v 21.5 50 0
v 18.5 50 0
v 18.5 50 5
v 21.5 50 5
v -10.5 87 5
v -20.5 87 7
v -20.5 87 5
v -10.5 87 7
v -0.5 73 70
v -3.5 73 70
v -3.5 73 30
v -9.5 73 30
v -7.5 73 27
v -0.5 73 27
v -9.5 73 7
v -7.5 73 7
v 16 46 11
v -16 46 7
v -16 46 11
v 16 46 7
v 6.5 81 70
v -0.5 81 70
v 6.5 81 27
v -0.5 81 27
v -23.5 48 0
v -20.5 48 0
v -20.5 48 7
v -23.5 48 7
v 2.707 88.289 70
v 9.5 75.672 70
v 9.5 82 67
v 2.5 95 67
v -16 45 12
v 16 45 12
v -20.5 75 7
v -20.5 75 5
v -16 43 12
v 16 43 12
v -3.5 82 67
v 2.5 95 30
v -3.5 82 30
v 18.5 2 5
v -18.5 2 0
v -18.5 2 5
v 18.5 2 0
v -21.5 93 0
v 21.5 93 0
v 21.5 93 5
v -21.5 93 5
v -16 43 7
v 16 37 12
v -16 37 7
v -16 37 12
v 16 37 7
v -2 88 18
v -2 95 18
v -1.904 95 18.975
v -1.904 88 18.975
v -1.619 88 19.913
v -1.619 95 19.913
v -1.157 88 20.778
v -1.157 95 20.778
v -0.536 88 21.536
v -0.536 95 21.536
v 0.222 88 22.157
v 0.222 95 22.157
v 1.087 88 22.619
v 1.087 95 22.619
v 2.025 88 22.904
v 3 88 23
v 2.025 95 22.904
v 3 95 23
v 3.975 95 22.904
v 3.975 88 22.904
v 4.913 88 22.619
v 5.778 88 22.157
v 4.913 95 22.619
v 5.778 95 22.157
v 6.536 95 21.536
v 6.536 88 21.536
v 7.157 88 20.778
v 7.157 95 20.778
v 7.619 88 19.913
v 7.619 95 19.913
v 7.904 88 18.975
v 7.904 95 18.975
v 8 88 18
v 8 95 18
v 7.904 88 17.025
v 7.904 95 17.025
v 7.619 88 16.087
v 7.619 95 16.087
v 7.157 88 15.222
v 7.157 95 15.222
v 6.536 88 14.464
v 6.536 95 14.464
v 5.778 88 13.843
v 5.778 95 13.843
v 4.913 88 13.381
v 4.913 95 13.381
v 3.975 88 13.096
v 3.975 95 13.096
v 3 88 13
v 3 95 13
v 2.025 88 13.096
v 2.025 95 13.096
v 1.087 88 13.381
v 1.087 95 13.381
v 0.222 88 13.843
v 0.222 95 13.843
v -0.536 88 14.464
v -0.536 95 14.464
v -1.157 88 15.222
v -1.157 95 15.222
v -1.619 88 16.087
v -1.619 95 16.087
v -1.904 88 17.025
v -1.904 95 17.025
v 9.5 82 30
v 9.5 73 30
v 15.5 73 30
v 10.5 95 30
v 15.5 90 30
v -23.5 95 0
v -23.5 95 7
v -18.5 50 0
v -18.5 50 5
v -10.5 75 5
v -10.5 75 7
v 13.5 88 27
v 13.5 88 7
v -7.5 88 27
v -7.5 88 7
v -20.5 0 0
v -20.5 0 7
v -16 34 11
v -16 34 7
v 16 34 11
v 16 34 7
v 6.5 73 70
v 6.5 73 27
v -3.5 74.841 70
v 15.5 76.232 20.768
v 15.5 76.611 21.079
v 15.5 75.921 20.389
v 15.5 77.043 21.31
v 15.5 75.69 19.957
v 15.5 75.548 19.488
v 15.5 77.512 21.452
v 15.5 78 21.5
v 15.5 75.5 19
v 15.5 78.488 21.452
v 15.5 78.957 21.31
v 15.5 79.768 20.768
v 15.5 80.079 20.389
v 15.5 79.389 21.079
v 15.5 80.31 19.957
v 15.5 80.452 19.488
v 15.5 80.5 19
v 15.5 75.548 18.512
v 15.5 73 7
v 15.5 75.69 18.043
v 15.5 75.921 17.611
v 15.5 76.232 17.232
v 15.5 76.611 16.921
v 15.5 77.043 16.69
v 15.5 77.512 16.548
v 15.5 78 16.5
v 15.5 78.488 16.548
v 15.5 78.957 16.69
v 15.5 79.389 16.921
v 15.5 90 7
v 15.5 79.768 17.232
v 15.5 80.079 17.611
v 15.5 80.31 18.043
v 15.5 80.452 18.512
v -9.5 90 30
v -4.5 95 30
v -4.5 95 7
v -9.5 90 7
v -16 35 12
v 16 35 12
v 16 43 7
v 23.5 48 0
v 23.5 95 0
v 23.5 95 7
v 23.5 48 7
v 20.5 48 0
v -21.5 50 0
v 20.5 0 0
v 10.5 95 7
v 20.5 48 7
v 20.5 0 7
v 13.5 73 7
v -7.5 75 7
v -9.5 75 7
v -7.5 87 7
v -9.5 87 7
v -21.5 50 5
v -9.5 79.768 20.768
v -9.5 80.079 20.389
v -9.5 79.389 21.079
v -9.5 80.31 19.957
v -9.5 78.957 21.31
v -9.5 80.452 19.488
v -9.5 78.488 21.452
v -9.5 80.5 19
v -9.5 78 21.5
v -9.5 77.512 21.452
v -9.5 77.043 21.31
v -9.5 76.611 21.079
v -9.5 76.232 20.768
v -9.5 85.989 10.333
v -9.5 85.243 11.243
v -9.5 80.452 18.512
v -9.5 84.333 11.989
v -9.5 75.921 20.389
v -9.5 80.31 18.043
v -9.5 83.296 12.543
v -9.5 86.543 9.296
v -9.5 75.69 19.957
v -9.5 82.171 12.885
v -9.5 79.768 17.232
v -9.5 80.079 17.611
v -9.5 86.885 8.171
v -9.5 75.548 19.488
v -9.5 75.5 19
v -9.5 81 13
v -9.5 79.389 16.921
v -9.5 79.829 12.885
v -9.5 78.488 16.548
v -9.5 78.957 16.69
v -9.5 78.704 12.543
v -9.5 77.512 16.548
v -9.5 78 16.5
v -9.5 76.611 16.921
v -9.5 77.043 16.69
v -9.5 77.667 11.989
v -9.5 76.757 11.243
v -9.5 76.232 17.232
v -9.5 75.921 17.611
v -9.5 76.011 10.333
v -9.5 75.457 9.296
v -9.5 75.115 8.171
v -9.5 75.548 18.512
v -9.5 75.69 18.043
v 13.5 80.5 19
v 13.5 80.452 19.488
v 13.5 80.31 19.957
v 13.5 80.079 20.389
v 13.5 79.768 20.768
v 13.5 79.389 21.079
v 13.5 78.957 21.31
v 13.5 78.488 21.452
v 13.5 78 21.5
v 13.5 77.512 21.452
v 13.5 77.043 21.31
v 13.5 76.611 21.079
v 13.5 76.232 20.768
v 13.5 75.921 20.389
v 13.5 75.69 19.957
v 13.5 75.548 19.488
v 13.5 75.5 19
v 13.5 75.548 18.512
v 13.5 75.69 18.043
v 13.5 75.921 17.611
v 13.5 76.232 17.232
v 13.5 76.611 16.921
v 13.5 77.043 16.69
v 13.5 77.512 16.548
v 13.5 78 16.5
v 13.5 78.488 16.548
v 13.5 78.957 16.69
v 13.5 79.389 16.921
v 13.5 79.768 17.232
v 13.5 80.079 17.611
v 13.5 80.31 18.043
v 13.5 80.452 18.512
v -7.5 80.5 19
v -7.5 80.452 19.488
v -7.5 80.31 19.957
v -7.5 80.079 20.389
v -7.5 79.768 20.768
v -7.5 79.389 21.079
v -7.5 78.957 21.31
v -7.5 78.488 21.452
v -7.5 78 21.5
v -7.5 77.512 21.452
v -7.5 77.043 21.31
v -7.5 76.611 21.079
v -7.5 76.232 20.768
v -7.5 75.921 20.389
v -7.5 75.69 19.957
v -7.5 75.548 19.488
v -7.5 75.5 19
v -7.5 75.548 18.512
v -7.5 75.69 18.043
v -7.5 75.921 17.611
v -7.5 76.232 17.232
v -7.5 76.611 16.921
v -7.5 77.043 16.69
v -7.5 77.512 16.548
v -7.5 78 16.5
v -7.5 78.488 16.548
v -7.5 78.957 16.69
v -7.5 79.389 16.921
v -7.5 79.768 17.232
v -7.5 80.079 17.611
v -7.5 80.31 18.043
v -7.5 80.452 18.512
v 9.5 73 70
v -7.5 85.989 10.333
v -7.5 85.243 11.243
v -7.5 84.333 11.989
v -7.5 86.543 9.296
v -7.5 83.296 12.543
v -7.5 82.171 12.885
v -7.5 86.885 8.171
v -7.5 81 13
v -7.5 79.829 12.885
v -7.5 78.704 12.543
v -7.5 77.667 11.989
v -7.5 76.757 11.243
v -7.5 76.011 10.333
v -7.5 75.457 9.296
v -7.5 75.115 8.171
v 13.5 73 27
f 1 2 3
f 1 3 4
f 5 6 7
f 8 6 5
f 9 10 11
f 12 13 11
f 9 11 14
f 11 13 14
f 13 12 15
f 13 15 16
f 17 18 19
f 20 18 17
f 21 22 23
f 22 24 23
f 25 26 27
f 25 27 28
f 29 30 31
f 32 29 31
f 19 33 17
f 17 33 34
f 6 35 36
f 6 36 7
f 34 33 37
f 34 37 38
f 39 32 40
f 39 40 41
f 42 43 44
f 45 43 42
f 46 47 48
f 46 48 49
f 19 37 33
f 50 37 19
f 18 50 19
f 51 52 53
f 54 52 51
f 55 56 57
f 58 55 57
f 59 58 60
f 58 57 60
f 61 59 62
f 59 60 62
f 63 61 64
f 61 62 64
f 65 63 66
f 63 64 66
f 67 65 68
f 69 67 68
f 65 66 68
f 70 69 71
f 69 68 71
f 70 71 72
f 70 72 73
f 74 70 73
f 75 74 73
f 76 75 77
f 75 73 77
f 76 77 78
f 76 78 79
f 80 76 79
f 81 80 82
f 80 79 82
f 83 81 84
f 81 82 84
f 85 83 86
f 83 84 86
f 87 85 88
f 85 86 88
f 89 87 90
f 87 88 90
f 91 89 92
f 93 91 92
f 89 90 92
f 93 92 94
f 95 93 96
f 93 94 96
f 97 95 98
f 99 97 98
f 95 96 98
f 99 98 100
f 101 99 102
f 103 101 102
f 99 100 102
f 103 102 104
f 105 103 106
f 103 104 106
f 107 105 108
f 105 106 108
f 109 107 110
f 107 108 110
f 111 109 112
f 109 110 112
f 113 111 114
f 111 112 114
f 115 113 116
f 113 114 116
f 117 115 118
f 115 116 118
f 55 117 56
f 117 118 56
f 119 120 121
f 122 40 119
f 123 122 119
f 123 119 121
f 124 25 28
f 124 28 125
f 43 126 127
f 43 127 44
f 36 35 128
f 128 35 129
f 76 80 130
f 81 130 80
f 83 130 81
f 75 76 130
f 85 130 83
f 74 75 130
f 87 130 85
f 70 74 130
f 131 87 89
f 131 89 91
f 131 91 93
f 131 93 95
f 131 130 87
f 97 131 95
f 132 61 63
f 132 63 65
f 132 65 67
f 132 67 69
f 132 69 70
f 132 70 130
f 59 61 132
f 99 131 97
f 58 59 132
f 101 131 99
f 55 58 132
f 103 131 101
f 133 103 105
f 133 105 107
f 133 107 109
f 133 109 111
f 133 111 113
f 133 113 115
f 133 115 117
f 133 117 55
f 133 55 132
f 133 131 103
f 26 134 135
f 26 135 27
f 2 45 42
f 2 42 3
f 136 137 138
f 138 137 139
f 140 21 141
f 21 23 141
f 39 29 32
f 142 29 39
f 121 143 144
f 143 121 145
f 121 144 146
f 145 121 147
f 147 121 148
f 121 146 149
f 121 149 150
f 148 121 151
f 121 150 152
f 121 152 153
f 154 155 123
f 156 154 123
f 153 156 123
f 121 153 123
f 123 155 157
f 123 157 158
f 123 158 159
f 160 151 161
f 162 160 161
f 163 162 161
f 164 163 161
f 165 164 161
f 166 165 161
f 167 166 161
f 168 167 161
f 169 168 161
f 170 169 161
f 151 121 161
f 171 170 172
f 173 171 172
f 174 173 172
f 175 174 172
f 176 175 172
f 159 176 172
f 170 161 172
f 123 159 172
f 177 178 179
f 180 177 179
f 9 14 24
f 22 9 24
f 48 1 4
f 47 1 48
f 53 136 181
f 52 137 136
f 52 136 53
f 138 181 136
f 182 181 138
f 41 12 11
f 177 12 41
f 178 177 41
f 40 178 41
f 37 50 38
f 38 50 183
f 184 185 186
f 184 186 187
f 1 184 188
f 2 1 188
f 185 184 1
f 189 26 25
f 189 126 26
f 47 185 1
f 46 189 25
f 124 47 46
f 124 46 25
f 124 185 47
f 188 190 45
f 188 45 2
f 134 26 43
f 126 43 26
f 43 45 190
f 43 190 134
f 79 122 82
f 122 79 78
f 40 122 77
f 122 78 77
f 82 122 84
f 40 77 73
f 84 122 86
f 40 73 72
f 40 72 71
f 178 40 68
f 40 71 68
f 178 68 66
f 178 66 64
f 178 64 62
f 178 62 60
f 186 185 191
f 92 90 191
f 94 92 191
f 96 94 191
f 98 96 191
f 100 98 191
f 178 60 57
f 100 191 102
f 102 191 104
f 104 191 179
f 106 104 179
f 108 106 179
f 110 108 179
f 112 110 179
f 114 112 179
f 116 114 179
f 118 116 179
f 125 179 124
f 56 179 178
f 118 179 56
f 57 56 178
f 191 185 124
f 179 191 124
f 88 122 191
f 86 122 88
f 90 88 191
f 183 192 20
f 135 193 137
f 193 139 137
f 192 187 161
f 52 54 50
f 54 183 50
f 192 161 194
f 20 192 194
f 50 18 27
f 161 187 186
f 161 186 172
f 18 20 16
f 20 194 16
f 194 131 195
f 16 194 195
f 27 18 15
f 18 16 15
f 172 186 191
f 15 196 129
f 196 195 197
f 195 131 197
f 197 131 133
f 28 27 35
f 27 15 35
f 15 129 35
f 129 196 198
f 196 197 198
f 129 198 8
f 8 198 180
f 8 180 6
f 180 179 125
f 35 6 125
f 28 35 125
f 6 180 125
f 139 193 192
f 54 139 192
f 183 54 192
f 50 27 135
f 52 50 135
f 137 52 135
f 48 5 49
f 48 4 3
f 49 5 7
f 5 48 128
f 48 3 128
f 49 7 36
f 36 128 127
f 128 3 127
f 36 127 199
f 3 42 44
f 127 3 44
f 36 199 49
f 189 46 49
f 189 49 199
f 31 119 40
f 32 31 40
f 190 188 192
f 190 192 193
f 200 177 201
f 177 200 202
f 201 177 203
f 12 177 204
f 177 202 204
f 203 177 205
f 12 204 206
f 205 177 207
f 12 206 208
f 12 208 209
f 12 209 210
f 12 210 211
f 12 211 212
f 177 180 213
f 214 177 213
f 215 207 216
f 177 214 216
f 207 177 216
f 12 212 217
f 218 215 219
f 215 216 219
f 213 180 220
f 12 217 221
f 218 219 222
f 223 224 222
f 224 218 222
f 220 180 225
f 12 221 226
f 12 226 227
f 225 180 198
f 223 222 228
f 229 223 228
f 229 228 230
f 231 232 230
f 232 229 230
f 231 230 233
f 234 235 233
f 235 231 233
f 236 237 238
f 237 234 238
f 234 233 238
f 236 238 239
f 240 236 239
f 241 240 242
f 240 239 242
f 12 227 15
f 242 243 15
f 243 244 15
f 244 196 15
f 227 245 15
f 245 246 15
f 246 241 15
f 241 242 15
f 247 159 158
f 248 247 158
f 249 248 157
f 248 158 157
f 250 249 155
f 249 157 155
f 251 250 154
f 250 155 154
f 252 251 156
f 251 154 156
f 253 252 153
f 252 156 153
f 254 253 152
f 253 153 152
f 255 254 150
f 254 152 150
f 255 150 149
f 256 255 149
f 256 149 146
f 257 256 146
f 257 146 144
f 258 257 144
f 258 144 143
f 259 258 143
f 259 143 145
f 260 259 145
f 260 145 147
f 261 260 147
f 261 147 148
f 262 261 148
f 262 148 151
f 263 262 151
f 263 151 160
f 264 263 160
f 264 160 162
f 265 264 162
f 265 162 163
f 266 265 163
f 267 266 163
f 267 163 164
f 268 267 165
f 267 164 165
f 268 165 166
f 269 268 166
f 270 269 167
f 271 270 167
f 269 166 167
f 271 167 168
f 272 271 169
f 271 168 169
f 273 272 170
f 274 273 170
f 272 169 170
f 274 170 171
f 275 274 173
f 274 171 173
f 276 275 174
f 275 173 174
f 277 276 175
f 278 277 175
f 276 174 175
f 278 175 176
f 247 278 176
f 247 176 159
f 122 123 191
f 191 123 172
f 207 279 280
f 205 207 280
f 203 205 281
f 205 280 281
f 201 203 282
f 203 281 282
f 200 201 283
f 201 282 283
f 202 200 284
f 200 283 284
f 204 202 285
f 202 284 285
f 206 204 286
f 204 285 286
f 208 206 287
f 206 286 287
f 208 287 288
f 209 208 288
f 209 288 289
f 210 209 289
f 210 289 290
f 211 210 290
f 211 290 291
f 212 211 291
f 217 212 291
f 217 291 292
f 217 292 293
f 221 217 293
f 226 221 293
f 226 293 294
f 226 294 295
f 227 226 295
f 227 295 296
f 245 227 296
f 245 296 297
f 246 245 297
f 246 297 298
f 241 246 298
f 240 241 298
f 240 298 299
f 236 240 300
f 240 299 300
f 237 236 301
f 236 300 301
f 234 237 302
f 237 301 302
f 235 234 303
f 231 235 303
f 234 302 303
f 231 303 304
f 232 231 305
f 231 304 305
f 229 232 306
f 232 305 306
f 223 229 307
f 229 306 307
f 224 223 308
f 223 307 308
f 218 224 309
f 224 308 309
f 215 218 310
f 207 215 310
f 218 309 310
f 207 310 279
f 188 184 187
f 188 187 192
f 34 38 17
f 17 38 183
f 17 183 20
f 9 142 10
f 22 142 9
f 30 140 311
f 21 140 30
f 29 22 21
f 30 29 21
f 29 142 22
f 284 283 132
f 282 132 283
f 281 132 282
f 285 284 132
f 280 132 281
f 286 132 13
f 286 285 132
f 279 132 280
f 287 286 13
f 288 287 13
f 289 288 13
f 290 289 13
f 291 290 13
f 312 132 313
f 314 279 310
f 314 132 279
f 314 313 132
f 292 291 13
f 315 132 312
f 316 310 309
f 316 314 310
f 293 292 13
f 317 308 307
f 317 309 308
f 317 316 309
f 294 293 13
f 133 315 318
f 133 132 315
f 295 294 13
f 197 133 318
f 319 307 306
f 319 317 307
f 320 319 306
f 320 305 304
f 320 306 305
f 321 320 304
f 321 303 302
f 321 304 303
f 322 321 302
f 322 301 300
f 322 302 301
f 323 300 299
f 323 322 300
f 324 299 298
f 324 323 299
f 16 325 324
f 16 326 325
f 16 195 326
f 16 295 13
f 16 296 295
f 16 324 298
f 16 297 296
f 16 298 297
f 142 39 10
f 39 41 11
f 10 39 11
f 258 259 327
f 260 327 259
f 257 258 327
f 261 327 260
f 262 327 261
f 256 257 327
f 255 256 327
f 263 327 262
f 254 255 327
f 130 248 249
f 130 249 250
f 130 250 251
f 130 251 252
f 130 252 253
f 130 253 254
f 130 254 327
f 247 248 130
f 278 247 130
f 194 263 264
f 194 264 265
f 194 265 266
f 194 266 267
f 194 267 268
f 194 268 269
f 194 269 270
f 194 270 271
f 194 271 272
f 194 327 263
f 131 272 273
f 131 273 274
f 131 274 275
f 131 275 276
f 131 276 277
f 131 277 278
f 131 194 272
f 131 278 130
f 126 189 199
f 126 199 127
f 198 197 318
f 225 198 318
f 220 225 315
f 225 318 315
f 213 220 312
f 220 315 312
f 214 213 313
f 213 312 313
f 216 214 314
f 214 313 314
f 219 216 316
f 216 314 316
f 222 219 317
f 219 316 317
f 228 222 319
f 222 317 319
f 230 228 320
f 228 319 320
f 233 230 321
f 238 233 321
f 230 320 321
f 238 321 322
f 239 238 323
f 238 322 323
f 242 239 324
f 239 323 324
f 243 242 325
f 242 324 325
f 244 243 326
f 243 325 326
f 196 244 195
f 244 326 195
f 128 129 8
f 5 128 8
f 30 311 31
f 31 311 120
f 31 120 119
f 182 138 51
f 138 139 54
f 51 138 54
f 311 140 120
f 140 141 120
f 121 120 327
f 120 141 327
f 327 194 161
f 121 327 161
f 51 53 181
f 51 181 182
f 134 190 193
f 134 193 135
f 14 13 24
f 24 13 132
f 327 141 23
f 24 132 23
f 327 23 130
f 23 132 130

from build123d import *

# Parameters (mm, degrees)
PAD_DEPTH       = 7
POCKET_DEPTH    = 5
SKETCH002_W     = 32
SKETCH002_H     = 3
PAD001_DEPTH    = 5
SKETCH003_W     = 10
SKETCH003_H     = 12
POCKET001_DEPTH = 2
PAD002_DEPTH    = 20
POCKET002_DEPTH = 5
SKETCH006_R     = 5
POCKET003_DEPTH = 7
PAD003_DEPTH    = 3
PAD004_DEPTH    = 40
CHAMFER_SIZE    = 5
CHAMFER001_SIZE = 5
CHAMFER002_SIZE = 3
CHAMFER003_SIZE = 1
CHAMFER004_SIZE = 1
SKETCH009_R     = 2.5
POCKET004_DEPTH = 39.001


with BuildPart() as part:
    # Sketch → Pad (new body)
    with BuildSketch(Plane.XY):
        Polygon((-23.5, 95), (23.5, 95), (23.5, 48), (20.5, 48), (20.5, 0), (-20.5, 0), (-20.5, 48), (-23.5, 48), align=None)
    extrude(amount=PAD_DEPTH)

    # Sketch001 (on Face9 of Pad) → Pocket (cut)
    with BuildSketch(Plane(origin=(0, 0, 0), x_dir=(1, 0, 0), z_dir=(0, 0, -1))):
        Polygon((-18.5, -2), (18.5, -2), (18.5, -50), (21.5, -50), (21.5, -93), (-21.5, -93), (-21.5, -50), (-18.5, -50), align=None)
    extrude(amount=-POCKET_DEPTH, mode=Mode.SUBTRACT)

    # Sketch002 (on Face5 of Pocket) → Pad001 (join)
    with BuildSketch(Plane.XY.offset(7)):
        with Locations((0, 44.5)):
            Rectangle(SKETCH002_W, SKETCH002_H)
        with Locations((0, 35.5)):
            Rectangle(SKETCH002_W, SKETCH002_H)
    extrude(amount=PAD001_DEPTH)

    # Sketch003 (on Face5 of Pad001) → Pocket001 (cut)
    with BuildSketch(Plane.XY.offset(7)):
        with Locations((-15.5, 81)):
            Rectangle(SKETCH003_W, SKETCH003_H)
    extrude(amount=-POCKET001_DEPTH, mode=Mode.SUBTRACT)

    # Sketch004 (on Face5 of Pocket001) → Pad002 (join)
    with BuildSketch(Plane.XY.offset(7)):
        Polygon((-9.5, 95), (15.5, 95), (15.5, 73), (13.5, 73), (13.5, 88), (-7.5, 88), (-7.5, 73), (-9.5, 73), align=None)
    extrude(amount=PAD002_DEPTH)

    # Sketch005 (on Face24 of Pad002) → Pocket002 (cut)
    with BuildSketch(Plane.YZ.offset(-7.5)):
        with BuildLine():
            ThreePointArc((87, 7), (81, 13), (75, 7))
            Line((75, 7), (87, 7))
        make_face()
    extrude(amount=-POCKET002_DEPTH, mode=Mode.SUBTRACT)

    # Sketch006 (on Face6 of Pad002) → Pocket003 (cut)
    with BuildSketch(Plane(origin=(0, 95, 0), x_dir=(-1, 0, 0), z_dir=(0, 1, 0))):
        with Locations((-3, 18)):
            Circle(SKETCH006_R)
    extrude(amount=-POCKET003_DEPTH, mode=Mode.SUBTRACT)

    # Sketch007 (on Face40 of Pocket003) → Pad003 (join)
    with BuildSketch(Plane.XY.offset(27)):
        Polygon((-9.5, 73), (-0.5, 73), (-0.5, 81), (6.5, 81), (6.5, 73), (15.5, 73), (15.5, 95), (-9.5, 95), align=None)
    extrude(amount=PAD003_DEPTH)

    # Sketch008 (on Face52 of Pad003) → Pad004 (join)
    with BuildSketch(Plane.XY.offset(30)):
        Polygon((-0.5, 73), (-0.5, 81), (6.5, 81), (6.5, 73), (9.5, 73), (9.5, 82), (2.5, 95), (-3.5, 82), (-3.5, 73), align=None)
    extrude(amount=PAD004_DEPTH)

    # Chamfer
    chamfer_edges = [part.edges().sort_by_distance(p)[0] for p in [
        (15.5, 95, 17),
    ]]
    chamfer(chamfer_edges, length=CHAMFER_SIZE)

    # Chamfer001
    chamfer001_edges = [part.edges().sort_by_distance(p)[0] for p in [
        (-9.5, 95, 17),
    ]]
    chamfer(chamfer001_edges, length=CHAMFER001_SIZE)

    # Chamfer002
    chamfer002_edges = [part.edges().sort_by_distance(p)[0] for p in [
        (6, 88.5, 70),
        (-0.5, 88.5, 70),
    ]]
    chamfer(chamfer002_edges, length=CHAMFER002_SIZE)

    # Chamfer003
    chamfer003_edges = [part.edges().sort_by_distance(p)[0] for p in [
        (0, 46, 12),
    ]]
    chamfer(chamfer003_edges, length=CHAMFER003_SIZE)

    # Chamfer004
    chamfer004_edges = [part.edges().sort_by_distance(p)[0] for p in [
        (0, 34, 12),
    ]]
    chamfer(chamfer004_edges, length=CHAMFER004_SIZE)

    # Sketch009 (on Face19 of Chamfer004) → Pocket004 (cut, through all)
    with BuildSketch(Plane.YZ.offset(15.5)):
        with Locations((78, 19)):
            Circle(SKETCH009_R)
    extrude(amount=-POCKET004_DEPTH, mode=Mode.SUBTRACT)


solid = part.part
